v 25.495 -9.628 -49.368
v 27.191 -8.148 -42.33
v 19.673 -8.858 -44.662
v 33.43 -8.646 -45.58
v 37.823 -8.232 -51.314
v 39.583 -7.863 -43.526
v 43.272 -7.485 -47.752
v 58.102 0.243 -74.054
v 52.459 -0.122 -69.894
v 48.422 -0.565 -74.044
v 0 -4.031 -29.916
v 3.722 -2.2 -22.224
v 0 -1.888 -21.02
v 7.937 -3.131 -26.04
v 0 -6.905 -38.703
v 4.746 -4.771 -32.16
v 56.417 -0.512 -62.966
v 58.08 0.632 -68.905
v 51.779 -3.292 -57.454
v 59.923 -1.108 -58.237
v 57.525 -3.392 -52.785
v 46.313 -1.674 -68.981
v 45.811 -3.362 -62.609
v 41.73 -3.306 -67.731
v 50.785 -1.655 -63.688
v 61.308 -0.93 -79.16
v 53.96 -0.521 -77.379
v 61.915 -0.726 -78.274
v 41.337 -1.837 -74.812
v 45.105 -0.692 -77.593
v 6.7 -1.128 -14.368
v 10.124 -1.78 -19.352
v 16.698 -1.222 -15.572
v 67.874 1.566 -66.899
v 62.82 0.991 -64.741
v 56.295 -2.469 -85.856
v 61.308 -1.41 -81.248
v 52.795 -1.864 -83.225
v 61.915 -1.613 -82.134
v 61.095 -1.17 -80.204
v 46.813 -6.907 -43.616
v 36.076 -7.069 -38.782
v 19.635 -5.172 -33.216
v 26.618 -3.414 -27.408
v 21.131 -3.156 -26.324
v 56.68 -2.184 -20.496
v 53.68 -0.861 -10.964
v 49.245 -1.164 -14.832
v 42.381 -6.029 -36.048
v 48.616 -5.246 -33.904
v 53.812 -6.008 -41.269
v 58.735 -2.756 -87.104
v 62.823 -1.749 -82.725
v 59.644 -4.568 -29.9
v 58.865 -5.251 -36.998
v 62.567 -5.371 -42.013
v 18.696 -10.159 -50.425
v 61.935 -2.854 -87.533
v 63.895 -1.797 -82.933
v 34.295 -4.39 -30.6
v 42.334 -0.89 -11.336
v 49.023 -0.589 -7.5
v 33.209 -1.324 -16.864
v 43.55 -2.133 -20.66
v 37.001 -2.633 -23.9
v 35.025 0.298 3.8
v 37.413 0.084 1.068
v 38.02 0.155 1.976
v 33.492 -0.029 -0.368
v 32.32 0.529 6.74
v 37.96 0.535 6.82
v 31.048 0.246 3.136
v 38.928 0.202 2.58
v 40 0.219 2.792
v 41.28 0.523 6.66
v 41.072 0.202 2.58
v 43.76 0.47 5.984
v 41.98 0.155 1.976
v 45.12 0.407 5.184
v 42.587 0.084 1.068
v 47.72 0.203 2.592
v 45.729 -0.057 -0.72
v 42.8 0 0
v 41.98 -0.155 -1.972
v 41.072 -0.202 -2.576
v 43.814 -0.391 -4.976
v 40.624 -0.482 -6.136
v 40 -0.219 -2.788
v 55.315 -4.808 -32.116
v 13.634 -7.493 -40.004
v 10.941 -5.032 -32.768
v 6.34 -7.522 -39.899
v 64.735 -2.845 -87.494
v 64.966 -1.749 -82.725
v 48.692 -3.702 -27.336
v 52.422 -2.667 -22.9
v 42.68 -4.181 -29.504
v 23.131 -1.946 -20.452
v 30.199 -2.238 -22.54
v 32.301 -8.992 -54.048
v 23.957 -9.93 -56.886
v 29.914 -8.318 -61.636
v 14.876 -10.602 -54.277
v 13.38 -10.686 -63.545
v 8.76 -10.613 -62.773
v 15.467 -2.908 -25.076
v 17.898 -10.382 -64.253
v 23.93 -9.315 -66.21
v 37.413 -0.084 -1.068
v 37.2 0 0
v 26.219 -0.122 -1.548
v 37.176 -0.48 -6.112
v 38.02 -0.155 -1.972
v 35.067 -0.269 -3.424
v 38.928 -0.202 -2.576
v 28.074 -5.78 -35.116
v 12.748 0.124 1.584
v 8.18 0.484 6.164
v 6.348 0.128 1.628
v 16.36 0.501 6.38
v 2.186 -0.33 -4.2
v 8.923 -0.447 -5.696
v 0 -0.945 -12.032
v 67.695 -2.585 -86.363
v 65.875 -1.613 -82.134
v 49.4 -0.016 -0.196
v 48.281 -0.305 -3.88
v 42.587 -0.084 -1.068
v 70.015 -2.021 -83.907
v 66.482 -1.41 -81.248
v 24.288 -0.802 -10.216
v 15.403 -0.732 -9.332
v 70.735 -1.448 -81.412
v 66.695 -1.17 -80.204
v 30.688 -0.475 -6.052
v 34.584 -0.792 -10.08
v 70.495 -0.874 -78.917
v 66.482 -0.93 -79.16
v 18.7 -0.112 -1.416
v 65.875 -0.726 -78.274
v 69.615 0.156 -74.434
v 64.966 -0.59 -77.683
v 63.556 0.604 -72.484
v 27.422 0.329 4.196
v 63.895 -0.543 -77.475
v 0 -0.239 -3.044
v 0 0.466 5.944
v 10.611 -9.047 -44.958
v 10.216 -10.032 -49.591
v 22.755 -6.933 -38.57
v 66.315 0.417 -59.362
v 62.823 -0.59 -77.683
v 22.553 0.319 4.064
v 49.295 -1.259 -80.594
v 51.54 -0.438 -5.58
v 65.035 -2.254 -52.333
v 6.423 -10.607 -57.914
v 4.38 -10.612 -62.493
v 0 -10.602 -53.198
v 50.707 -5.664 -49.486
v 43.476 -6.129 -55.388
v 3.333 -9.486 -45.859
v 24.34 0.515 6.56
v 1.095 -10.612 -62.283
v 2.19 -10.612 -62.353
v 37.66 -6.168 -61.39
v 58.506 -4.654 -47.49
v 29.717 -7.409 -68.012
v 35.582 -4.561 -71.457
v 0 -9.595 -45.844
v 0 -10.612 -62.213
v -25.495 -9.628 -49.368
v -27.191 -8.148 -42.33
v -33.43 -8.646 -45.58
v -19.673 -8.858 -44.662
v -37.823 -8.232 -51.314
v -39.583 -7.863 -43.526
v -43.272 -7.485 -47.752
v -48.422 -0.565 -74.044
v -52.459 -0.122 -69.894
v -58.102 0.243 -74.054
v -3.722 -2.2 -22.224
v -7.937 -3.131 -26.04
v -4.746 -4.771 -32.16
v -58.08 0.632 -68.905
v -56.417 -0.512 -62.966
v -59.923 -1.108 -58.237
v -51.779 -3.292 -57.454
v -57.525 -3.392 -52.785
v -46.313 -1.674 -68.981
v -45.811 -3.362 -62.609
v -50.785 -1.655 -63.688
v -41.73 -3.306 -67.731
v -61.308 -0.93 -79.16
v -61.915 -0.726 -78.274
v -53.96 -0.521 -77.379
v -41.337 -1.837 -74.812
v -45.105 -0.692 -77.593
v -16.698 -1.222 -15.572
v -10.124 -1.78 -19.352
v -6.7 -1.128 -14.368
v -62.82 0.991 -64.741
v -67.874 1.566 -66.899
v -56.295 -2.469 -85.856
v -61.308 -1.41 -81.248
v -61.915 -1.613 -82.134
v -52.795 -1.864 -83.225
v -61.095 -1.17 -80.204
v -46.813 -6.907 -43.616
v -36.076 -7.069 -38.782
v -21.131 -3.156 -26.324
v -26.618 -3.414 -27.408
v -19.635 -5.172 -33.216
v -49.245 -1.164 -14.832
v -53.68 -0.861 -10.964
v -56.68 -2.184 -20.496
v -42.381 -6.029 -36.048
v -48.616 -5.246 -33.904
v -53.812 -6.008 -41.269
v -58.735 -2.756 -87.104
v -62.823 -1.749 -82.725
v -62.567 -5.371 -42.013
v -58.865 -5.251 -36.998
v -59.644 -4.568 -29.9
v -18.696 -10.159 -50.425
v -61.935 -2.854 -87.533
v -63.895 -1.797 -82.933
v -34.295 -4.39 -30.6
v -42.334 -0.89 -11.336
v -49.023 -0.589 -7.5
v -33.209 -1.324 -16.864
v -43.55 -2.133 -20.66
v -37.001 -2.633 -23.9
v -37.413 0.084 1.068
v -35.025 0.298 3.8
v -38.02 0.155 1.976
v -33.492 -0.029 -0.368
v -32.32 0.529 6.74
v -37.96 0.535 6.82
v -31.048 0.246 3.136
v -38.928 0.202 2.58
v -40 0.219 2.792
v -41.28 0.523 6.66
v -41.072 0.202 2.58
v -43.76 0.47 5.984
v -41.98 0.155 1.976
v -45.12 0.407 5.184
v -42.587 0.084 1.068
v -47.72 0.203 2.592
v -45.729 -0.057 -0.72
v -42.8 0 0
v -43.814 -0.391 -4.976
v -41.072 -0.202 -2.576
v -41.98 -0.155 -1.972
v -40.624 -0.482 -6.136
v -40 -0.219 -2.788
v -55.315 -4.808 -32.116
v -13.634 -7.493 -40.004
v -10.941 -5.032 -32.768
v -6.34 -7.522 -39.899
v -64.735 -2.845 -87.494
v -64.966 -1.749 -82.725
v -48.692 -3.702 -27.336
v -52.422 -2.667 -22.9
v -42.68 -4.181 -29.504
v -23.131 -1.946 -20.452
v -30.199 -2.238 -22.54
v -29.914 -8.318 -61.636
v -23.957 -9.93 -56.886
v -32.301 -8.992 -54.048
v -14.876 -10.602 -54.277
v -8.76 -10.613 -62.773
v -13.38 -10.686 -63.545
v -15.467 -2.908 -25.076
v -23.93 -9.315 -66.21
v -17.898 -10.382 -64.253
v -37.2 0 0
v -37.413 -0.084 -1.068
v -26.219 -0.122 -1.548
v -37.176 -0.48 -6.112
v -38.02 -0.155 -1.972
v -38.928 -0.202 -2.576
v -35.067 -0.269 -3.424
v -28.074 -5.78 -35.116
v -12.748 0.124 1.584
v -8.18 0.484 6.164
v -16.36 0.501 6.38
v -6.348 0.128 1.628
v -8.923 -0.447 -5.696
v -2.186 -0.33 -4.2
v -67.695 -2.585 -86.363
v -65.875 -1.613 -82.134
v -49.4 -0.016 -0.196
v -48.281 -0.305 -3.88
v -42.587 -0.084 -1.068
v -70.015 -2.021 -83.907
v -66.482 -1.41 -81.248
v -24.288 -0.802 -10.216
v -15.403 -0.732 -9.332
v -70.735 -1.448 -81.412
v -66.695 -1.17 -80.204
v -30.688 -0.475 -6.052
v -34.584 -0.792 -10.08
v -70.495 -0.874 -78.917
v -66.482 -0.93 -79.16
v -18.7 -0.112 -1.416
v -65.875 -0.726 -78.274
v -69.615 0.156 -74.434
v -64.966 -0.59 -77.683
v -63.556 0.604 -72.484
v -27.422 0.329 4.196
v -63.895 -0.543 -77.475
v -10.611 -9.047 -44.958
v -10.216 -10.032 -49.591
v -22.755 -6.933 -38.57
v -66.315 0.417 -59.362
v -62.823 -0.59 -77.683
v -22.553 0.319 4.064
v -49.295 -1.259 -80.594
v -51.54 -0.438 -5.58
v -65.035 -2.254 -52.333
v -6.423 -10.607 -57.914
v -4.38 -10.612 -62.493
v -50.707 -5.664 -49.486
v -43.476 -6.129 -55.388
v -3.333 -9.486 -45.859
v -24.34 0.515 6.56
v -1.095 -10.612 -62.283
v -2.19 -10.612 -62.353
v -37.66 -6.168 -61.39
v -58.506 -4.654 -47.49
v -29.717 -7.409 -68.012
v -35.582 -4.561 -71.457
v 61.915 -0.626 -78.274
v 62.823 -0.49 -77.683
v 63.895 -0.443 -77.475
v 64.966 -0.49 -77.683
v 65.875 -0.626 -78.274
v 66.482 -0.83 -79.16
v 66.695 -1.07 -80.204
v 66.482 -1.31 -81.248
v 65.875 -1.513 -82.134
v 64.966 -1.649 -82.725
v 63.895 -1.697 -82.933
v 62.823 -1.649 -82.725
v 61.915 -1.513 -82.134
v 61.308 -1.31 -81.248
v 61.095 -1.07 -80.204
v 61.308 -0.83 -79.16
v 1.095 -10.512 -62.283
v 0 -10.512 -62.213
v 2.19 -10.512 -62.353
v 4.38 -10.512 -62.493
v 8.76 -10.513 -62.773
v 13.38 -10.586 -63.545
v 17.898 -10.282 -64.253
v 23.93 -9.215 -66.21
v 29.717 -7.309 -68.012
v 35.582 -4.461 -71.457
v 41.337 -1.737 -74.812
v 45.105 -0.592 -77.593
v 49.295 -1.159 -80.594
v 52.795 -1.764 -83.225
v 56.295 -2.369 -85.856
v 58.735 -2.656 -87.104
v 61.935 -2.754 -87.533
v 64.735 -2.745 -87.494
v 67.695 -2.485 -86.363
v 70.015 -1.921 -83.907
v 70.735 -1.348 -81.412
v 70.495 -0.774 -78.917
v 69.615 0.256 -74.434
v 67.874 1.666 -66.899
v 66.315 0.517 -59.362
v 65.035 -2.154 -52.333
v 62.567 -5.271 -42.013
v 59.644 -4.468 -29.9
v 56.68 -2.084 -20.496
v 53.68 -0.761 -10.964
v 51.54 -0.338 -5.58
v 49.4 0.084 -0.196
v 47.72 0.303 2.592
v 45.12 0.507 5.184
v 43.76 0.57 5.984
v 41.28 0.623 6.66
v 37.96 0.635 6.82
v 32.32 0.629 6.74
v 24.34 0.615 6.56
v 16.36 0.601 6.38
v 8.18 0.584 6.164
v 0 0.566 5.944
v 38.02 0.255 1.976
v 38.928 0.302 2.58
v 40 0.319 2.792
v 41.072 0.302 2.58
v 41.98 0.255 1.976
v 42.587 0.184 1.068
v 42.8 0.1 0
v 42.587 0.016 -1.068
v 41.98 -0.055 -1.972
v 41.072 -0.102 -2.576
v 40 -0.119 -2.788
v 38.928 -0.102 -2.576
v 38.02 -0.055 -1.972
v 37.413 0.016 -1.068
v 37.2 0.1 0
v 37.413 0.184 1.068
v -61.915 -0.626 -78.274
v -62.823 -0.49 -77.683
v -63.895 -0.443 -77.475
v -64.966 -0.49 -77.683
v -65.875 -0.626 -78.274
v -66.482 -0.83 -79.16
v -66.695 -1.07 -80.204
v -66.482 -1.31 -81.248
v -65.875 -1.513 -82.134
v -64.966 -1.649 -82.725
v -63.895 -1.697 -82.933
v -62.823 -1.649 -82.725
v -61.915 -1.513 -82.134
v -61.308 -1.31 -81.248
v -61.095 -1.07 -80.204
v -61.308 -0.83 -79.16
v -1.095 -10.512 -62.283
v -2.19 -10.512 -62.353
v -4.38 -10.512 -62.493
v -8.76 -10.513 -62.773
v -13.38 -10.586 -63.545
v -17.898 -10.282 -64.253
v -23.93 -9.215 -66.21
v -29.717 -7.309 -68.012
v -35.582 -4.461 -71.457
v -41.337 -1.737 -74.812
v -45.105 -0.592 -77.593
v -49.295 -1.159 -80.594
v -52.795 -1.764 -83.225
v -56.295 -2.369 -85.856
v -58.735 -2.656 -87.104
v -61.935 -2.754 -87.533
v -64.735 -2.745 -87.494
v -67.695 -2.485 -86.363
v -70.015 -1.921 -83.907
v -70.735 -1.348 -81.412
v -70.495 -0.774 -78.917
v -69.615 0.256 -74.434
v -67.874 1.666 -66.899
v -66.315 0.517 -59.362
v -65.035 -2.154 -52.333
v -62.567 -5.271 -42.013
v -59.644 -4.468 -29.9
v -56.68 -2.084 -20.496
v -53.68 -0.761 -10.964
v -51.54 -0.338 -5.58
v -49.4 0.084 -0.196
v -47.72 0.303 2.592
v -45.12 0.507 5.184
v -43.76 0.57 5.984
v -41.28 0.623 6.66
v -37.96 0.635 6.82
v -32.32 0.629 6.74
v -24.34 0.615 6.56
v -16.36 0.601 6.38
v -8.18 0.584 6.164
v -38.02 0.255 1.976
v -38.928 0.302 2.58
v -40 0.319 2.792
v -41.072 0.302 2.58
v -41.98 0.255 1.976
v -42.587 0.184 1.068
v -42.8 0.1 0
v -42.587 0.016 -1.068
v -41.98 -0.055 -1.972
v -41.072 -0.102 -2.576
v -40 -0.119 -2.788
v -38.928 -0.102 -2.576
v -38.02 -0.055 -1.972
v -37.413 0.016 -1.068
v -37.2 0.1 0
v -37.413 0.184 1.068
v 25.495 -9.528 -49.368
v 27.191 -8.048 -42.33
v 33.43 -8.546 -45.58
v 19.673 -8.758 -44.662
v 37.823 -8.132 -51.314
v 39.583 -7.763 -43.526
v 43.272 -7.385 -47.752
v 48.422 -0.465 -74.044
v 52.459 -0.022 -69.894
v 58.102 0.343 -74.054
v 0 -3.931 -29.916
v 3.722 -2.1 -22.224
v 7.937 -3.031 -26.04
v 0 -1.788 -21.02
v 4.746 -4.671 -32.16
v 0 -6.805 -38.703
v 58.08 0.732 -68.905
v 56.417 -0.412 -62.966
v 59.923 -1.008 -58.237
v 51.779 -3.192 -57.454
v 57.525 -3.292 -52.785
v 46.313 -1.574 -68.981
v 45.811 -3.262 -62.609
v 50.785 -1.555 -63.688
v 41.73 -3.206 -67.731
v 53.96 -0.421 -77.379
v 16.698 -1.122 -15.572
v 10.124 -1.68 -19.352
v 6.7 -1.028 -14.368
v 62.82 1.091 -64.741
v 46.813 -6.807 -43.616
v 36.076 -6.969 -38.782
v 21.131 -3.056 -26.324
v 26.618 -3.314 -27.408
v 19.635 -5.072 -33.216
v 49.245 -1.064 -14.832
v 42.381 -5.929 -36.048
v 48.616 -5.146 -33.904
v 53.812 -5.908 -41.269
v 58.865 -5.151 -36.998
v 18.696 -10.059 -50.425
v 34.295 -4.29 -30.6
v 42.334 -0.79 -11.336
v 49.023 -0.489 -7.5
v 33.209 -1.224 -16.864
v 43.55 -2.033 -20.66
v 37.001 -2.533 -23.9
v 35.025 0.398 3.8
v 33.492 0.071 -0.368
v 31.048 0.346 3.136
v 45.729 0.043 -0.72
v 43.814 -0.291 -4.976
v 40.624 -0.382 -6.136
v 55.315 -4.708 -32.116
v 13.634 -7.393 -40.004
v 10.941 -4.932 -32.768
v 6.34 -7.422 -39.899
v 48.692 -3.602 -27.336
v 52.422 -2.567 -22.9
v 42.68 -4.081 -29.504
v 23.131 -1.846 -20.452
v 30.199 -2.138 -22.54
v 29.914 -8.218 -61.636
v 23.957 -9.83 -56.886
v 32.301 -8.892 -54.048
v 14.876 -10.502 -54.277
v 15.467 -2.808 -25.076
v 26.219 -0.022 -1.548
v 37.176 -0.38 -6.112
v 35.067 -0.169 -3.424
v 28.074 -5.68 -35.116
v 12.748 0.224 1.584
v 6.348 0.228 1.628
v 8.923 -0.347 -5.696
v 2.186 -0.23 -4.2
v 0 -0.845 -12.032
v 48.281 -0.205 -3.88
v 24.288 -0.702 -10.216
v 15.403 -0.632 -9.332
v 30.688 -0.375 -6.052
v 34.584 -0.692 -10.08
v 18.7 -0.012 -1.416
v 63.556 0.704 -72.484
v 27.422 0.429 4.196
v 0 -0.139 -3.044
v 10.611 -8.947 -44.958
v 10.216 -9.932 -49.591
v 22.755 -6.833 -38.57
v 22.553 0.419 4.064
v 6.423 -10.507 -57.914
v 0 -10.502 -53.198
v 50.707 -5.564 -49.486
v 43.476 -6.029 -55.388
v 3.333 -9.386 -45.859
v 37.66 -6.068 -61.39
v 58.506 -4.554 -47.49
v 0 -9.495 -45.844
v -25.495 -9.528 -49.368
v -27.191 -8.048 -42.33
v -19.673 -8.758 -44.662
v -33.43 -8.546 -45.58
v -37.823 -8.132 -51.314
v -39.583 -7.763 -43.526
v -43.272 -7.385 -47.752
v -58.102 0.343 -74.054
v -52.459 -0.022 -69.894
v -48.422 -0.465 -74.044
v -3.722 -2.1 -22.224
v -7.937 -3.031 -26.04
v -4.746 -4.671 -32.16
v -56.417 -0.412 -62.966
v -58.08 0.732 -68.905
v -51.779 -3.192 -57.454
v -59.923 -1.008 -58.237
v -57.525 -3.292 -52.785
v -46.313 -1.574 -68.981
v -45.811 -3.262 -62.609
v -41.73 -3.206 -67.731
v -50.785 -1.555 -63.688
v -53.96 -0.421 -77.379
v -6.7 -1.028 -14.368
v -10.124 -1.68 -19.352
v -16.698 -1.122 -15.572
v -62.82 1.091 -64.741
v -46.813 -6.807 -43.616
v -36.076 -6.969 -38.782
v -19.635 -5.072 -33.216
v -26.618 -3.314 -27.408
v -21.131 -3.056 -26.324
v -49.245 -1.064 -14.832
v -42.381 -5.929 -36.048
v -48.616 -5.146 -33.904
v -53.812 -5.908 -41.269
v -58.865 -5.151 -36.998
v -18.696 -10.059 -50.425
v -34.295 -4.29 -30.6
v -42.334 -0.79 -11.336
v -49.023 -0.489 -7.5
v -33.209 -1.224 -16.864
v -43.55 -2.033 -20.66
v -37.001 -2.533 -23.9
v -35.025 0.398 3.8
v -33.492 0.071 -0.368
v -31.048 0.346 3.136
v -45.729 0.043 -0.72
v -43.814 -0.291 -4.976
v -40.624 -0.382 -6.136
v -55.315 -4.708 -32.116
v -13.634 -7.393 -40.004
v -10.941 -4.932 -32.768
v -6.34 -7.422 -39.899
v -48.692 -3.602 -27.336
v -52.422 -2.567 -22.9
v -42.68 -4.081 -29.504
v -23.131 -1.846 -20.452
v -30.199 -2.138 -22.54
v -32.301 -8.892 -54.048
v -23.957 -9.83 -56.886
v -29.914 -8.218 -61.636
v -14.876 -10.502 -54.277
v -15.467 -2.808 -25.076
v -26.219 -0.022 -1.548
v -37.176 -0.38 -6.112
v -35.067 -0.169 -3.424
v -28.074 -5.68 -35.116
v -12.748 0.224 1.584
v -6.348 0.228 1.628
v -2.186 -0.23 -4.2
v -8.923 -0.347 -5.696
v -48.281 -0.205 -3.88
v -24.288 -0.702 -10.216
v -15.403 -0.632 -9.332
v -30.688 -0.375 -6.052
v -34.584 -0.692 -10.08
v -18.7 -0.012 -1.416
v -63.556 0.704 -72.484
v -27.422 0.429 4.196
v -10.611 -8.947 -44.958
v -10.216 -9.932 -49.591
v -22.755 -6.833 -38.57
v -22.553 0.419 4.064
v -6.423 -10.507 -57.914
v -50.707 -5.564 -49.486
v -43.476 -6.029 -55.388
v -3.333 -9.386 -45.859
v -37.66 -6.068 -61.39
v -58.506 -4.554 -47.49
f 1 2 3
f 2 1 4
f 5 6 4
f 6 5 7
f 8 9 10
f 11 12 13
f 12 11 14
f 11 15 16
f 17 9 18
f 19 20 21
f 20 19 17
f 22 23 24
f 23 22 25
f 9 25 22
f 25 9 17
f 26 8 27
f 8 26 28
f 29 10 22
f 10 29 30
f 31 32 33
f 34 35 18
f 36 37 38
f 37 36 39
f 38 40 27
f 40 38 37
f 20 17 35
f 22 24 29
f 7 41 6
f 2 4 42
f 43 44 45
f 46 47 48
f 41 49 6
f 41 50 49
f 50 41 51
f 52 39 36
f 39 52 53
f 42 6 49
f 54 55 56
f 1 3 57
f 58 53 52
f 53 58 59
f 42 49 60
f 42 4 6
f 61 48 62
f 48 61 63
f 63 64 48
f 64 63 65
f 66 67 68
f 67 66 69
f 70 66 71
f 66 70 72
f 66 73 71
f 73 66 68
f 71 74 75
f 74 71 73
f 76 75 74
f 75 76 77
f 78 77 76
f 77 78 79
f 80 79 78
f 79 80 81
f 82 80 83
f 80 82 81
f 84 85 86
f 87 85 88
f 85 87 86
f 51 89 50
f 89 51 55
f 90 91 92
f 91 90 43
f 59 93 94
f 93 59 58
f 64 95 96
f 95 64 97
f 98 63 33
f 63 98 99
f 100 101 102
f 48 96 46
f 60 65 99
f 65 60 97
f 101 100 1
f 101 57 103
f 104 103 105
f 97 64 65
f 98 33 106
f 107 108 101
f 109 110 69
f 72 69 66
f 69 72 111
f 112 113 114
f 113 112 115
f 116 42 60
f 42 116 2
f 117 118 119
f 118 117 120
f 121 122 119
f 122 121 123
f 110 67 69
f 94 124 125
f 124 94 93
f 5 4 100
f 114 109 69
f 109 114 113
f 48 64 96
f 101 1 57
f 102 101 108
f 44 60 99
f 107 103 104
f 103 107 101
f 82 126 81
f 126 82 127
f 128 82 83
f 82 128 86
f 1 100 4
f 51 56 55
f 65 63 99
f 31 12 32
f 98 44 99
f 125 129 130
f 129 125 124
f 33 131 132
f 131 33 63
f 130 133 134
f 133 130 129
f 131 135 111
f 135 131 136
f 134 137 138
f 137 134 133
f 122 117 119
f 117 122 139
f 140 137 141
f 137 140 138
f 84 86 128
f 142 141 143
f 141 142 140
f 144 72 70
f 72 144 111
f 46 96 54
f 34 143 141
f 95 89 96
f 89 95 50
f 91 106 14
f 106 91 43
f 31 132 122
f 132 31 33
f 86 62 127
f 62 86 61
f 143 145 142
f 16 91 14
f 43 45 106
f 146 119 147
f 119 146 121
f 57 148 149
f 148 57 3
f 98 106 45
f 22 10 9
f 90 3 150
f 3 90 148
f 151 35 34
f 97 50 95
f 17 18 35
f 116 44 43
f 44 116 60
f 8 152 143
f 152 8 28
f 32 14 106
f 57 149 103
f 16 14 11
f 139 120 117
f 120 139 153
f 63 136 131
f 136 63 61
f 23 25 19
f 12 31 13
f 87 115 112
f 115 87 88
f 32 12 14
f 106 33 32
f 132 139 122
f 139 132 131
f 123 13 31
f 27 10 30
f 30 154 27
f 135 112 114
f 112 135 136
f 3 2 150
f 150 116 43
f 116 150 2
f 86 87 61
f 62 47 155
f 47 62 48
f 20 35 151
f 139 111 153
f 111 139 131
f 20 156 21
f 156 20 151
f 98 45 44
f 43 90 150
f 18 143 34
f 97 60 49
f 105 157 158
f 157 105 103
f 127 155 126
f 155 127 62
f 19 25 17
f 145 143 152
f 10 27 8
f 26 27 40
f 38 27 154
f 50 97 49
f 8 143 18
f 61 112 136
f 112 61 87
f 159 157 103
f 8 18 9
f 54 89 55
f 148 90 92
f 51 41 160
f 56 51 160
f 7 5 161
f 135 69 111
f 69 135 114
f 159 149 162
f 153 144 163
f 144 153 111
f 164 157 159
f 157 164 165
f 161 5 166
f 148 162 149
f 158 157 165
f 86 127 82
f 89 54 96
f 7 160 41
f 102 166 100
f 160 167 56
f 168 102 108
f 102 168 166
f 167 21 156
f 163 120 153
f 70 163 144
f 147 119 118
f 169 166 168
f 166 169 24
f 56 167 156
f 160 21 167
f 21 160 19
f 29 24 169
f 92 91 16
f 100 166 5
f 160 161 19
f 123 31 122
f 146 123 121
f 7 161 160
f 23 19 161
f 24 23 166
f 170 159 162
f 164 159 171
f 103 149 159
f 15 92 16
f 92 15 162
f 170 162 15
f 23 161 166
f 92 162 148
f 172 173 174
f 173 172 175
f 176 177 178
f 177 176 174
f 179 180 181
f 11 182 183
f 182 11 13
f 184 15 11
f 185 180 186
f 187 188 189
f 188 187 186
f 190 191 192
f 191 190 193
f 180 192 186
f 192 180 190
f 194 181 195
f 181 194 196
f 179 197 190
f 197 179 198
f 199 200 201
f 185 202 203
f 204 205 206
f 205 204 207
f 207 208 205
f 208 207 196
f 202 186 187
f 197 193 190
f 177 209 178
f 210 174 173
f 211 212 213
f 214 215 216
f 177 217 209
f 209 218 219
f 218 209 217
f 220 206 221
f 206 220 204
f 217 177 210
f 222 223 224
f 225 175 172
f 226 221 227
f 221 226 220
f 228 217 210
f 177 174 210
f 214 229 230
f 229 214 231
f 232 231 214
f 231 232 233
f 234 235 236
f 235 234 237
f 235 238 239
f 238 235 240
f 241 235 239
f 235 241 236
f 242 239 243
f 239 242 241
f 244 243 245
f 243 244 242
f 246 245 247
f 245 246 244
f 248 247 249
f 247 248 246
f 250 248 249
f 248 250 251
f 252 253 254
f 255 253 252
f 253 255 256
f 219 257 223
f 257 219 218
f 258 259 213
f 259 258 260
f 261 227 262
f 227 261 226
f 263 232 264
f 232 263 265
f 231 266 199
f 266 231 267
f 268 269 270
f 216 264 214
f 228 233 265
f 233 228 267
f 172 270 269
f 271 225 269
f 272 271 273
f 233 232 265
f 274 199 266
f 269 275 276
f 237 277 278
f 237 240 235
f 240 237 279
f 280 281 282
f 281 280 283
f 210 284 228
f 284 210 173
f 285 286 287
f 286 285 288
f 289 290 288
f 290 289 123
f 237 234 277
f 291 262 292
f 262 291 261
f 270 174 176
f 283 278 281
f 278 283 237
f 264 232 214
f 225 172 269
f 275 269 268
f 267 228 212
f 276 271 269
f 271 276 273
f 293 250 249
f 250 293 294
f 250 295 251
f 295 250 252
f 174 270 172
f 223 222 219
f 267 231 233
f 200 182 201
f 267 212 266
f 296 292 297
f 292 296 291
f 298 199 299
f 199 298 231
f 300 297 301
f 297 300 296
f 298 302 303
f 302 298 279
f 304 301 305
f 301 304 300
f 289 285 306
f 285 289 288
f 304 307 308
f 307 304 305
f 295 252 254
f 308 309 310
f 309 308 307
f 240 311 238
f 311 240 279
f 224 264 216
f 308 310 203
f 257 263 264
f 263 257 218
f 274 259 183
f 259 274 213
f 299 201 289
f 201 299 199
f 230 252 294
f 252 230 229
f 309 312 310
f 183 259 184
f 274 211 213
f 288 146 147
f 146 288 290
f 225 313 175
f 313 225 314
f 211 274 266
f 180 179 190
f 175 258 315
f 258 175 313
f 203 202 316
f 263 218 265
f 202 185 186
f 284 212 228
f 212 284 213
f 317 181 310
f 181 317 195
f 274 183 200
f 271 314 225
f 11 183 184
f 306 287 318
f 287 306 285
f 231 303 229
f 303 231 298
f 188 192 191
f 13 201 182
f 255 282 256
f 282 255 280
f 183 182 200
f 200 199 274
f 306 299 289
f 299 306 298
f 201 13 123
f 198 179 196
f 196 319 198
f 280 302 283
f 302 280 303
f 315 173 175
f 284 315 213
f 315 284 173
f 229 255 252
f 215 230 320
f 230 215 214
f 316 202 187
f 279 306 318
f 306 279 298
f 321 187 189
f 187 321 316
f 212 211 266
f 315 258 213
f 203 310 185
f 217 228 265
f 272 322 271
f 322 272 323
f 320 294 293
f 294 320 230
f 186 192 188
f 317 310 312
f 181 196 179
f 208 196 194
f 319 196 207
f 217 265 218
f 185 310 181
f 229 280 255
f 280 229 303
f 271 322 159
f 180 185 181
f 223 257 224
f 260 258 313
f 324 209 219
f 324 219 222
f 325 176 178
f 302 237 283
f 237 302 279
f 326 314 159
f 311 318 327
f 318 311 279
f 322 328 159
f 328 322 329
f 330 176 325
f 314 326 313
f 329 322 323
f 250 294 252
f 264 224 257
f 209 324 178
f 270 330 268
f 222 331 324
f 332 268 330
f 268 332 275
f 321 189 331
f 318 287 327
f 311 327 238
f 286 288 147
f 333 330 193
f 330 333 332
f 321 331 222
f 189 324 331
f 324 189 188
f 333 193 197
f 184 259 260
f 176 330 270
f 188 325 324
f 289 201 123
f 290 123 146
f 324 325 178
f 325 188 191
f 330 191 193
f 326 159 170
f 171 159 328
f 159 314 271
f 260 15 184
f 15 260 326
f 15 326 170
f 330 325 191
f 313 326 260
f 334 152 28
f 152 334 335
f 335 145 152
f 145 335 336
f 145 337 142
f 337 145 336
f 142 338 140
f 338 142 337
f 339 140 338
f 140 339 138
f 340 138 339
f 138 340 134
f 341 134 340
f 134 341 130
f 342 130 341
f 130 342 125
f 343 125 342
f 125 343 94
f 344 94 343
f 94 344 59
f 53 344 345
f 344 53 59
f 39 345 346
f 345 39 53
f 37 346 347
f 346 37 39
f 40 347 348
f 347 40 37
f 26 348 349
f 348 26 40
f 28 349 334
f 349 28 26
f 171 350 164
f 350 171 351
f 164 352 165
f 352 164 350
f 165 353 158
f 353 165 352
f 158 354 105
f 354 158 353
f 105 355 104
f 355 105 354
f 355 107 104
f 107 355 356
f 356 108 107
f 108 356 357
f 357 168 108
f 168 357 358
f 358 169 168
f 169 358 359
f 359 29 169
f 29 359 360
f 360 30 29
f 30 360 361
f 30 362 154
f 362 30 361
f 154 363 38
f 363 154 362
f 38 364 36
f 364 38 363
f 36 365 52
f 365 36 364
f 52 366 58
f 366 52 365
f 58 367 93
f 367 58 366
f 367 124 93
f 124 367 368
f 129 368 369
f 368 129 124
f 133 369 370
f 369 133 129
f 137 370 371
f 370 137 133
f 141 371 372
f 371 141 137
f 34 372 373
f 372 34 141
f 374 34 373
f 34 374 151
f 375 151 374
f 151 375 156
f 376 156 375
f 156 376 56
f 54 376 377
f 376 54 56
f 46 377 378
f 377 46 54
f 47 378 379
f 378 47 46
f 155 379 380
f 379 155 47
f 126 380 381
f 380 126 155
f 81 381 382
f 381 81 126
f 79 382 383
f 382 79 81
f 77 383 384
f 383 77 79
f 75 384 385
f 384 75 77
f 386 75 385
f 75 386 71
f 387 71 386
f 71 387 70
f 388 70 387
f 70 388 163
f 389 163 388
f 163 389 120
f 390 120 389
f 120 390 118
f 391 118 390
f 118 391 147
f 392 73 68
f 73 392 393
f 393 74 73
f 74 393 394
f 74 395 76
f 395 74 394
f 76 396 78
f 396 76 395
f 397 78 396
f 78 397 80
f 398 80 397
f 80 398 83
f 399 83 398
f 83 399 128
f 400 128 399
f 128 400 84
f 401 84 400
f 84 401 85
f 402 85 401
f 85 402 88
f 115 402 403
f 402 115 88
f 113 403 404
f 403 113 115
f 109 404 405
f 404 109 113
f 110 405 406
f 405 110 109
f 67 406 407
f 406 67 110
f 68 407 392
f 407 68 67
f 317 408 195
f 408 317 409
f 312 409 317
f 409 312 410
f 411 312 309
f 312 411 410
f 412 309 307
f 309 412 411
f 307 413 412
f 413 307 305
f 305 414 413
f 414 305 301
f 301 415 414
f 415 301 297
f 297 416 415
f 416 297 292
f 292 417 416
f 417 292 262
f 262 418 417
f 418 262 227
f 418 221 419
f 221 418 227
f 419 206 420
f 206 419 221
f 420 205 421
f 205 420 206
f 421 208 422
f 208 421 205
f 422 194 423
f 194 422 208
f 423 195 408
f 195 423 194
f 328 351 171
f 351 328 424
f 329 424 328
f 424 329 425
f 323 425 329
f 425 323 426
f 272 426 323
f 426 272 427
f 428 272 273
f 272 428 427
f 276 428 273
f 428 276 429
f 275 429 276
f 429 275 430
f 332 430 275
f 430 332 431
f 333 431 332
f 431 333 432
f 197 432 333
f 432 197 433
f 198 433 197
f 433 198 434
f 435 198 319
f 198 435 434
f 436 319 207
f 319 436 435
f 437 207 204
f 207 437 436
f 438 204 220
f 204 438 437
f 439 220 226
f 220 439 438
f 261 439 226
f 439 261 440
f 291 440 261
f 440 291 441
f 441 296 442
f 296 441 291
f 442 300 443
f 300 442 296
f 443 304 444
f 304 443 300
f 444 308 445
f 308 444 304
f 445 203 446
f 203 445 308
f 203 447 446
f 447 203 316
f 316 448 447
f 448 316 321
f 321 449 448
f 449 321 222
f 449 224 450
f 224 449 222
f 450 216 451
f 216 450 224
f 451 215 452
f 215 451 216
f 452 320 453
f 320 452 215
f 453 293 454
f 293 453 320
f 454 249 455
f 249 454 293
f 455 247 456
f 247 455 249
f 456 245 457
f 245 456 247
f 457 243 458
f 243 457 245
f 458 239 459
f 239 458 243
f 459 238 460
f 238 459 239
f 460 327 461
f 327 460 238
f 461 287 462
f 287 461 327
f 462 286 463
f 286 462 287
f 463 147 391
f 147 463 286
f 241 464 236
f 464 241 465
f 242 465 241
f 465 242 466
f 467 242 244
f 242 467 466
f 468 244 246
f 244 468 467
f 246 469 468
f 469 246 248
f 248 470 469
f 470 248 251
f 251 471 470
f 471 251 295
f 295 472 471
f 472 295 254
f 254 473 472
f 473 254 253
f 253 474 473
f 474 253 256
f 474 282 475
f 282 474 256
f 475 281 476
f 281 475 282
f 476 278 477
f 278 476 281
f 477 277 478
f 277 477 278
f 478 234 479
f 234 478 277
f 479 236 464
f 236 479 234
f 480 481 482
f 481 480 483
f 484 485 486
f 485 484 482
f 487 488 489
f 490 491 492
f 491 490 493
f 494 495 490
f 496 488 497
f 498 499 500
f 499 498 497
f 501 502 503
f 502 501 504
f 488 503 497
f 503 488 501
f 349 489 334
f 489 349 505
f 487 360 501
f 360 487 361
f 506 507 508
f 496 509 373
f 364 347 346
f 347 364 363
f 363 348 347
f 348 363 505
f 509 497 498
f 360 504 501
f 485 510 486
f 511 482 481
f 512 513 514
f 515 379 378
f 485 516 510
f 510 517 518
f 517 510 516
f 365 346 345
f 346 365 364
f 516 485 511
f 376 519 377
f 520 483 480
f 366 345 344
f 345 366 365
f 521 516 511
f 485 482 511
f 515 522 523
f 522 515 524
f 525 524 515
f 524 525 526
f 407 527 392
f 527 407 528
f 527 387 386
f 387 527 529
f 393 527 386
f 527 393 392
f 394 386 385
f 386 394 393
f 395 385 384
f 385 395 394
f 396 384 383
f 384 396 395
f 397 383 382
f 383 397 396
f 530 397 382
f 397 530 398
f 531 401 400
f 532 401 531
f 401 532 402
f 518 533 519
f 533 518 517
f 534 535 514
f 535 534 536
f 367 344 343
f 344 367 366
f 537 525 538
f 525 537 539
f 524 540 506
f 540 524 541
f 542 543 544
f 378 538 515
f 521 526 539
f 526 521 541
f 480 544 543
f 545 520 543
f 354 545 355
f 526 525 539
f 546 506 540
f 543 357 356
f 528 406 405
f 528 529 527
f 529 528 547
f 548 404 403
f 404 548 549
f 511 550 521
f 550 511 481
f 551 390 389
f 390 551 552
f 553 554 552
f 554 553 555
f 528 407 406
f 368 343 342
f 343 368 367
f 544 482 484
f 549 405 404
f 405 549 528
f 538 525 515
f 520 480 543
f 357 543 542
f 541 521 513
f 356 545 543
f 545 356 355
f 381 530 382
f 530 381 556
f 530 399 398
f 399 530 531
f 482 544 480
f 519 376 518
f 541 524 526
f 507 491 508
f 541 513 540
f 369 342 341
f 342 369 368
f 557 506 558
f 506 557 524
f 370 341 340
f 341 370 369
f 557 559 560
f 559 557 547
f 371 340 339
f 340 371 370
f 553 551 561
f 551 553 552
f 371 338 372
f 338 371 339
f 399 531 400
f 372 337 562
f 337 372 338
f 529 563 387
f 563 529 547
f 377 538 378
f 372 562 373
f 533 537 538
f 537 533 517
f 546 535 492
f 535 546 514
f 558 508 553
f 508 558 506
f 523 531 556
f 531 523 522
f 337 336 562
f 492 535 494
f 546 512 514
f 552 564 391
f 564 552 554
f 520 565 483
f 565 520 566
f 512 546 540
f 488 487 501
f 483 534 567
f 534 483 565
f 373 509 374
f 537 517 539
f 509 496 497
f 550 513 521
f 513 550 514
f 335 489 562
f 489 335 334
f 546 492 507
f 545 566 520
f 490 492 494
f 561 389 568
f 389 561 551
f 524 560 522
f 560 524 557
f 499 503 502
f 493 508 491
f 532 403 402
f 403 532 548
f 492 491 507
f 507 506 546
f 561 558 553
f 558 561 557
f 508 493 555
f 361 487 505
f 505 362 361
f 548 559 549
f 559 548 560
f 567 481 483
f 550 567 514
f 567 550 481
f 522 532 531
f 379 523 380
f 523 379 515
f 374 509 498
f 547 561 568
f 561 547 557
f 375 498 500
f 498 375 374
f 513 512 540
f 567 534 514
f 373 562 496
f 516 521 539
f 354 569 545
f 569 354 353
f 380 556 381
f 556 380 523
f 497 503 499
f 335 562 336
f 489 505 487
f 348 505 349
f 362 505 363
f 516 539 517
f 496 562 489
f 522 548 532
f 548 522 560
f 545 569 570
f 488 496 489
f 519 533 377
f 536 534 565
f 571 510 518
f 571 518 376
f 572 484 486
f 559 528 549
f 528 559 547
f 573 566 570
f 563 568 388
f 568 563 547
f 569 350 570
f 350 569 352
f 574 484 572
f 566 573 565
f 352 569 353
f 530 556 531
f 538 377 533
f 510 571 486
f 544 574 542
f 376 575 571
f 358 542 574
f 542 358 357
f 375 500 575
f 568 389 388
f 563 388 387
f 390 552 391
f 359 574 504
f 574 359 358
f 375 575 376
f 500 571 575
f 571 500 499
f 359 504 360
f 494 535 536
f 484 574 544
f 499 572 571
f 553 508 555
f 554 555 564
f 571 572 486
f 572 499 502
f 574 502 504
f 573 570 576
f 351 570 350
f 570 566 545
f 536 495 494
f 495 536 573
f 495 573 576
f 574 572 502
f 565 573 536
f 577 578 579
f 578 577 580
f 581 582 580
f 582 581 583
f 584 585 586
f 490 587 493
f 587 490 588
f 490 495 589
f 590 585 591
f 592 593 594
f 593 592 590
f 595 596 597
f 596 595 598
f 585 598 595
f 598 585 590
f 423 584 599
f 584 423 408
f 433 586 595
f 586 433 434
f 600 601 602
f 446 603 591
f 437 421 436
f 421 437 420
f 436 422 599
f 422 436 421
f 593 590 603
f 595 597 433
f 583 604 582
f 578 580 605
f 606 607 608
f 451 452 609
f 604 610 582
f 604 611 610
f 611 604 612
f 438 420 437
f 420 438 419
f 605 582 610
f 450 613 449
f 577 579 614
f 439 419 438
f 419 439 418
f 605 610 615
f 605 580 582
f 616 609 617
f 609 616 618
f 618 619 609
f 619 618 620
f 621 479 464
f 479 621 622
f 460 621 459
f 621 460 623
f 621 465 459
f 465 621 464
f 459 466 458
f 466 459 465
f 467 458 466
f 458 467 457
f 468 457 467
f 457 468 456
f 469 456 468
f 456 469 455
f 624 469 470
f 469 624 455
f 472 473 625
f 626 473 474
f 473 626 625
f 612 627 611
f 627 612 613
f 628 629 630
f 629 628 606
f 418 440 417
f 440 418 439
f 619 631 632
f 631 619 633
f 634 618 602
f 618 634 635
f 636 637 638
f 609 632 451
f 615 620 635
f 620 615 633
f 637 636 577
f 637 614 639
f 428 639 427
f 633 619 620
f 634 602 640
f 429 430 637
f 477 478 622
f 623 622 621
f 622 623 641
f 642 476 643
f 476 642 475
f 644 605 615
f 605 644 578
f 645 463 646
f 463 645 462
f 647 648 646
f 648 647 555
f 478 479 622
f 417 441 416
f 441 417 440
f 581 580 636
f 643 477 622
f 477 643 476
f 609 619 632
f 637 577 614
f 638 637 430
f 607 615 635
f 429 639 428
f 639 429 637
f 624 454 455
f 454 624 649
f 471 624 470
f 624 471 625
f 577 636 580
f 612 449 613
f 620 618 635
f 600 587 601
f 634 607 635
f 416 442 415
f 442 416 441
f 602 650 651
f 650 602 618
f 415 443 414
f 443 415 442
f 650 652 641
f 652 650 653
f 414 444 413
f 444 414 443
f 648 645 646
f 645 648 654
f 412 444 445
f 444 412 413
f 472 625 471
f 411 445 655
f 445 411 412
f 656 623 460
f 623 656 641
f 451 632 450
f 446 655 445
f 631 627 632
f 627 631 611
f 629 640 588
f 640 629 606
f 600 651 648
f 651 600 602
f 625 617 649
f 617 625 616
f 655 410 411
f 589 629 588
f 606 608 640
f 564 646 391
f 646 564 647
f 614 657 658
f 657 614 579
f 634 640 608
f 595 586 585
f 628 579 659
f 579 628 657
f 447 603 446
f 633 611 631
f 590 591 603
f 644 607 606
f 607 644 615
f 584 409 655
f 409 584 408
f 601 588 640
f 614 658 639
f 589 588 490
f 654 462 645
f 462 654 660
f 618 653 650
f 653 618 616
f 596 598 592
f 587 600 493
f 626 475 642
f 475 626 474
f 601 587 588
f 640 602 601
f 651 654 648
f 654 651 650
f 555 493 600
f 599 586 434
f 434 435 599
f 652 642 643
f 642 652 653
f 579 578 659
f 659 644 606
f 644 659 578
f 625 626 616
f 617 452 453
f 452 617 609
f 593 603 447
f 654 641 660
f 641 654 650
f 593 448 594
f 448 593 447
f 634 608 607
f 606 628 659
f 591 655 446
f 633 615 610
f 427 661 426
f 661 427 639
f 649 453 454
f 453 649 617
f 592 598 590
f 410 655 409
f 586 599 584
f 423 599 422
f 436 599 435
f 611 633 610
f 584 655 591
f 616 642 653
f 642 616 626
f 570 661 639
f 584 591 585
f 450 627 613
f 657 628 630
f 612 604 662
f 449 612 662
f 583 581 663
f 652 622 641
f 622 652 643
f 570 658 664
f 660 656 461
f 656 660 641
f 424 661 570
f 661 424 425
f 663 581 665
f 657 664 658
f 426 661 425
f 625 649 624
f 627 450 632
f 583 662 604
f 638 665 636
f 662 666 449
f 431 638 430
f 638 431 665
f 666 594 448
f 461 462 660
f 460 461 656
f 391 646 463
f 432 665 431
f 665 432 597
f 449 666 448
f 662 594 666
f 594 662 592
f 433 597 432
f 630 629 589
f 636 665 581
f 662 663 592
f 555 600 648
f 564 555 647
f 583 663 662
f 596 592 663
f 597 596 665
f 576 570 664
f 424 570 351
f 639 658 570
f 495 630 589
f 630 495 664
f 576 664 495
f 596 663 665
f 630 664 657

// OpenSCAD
use <../lib.scad>
use <s/96714c01s01.scad>
use <s/96714c01s02.scad>
$fa=1; $fs=0.2;
function ldraw_lib__96714c01(realsolid=false) = [
// 0 Sheet Fabric 17.5 x 12.5 Trapezoidal Sail (Formed)
// 0 Name: 96714c01.dat
// 0 Author: Philippe Hurbain [Philo]
// 0 !LDRAW_ORG Part UPDATE 2020-02
// 0 !LICENSE Licensed under CC BY 2.0 and CC BY 4.0 : see CAreadme.txt
// 
// 0 !HELP Shaped for 4184 The Black Pearl
// 0 !HELP Center mast, top sail
// 
// 0 BFC CERTIFY CCW
  [0,"BFC","CERTIFY"],
  [0,"BFC","CCW"],
// 
// 0 !CATEGORY Sheet Fabric
// 0 !KEYWORDS Black Pearl, set 4184
// 
// 0 !HISTORY 2014-12-23 [PTadmin] Official Update 2014-02
// 0 !HISTORY 2019-01-25 [cwdee] Update category
// 0 !HISTORY 2019-06-28 [PTadmin] Official Update 2019-01
// 0 !HISTORY 2020-06-10 [cwdee] Update description
// 0 !HISTORY 2020-09-05 [PTadmin] Official Update 2020-02
// 
// 
// 1 16 0 0 0 1 0 0 0 1 0 0 0 1 s\96714c01s01.dat
  [1,16,0,0,0,1,0,0,0,1,0,0,0,1, ldraw_lib__s__96714c01s01(realsolid)],
// 1 16 0 0 0 -1 0 0 0 1 0 0 0 1 s\96714c01s01.dat
  [1,16,0,0,0,-1,0,0,0,1,0,0,0,1, ldraw_lib__s__96714c01s01(realsolid)],
// 1 16 0 0 0 1 0 0 0 1 0 0 0 1 s\96714c01s02.dat
  [1,16,0,0,0,1,0,0,0,1,0,0,0,1, ldraw_lib__s__96714c01s02(realsolid)],
// 1 16 0 0 0 -1 0 0 0 1 0 0 0 1 s\96714c01s02.dat
  [1,16,0,0,0,-1,0,0,0,1,0,0,0,1, ldraw_lib__s__96714c01s02(realsolid)],
// 0 BFC INVERTNEXT
  [0,"BFC","INVERTNEXT"],
// 1 16 0 0 0.25 1 0 0 0 1 0 0 0 1 s\96714c01s01.dat
  [1,16,0,0,0.25,1,0,0,0,1,0,0,0,1, ldraw_lib__s__96714c01s01(realsolid)],
// 0 BFC INVERTNEXT
  [0,"BFC","INVERTNEXT"],
// 1 16 0 0 0.25 -1 0 0 0 1 0 0 0 1 s\96714c01s01.dat
  [1,16,0,0,0.25,-1,0,0,0,1,0,0,0,1, ldraw_lib__s__96714c01s01(realsolid)],
];
module ldraw_lib__96714c01(step=0, col=false, unit=2/5, alt=false, line=0.2, solid=!$preview)
    makepoly(ldraw_lib__96714c01(solid), step=step, col=col, unit=unit, alt=alt, line=line, solid=solid);
ldraw_lib__96714c01(line=0.2);
